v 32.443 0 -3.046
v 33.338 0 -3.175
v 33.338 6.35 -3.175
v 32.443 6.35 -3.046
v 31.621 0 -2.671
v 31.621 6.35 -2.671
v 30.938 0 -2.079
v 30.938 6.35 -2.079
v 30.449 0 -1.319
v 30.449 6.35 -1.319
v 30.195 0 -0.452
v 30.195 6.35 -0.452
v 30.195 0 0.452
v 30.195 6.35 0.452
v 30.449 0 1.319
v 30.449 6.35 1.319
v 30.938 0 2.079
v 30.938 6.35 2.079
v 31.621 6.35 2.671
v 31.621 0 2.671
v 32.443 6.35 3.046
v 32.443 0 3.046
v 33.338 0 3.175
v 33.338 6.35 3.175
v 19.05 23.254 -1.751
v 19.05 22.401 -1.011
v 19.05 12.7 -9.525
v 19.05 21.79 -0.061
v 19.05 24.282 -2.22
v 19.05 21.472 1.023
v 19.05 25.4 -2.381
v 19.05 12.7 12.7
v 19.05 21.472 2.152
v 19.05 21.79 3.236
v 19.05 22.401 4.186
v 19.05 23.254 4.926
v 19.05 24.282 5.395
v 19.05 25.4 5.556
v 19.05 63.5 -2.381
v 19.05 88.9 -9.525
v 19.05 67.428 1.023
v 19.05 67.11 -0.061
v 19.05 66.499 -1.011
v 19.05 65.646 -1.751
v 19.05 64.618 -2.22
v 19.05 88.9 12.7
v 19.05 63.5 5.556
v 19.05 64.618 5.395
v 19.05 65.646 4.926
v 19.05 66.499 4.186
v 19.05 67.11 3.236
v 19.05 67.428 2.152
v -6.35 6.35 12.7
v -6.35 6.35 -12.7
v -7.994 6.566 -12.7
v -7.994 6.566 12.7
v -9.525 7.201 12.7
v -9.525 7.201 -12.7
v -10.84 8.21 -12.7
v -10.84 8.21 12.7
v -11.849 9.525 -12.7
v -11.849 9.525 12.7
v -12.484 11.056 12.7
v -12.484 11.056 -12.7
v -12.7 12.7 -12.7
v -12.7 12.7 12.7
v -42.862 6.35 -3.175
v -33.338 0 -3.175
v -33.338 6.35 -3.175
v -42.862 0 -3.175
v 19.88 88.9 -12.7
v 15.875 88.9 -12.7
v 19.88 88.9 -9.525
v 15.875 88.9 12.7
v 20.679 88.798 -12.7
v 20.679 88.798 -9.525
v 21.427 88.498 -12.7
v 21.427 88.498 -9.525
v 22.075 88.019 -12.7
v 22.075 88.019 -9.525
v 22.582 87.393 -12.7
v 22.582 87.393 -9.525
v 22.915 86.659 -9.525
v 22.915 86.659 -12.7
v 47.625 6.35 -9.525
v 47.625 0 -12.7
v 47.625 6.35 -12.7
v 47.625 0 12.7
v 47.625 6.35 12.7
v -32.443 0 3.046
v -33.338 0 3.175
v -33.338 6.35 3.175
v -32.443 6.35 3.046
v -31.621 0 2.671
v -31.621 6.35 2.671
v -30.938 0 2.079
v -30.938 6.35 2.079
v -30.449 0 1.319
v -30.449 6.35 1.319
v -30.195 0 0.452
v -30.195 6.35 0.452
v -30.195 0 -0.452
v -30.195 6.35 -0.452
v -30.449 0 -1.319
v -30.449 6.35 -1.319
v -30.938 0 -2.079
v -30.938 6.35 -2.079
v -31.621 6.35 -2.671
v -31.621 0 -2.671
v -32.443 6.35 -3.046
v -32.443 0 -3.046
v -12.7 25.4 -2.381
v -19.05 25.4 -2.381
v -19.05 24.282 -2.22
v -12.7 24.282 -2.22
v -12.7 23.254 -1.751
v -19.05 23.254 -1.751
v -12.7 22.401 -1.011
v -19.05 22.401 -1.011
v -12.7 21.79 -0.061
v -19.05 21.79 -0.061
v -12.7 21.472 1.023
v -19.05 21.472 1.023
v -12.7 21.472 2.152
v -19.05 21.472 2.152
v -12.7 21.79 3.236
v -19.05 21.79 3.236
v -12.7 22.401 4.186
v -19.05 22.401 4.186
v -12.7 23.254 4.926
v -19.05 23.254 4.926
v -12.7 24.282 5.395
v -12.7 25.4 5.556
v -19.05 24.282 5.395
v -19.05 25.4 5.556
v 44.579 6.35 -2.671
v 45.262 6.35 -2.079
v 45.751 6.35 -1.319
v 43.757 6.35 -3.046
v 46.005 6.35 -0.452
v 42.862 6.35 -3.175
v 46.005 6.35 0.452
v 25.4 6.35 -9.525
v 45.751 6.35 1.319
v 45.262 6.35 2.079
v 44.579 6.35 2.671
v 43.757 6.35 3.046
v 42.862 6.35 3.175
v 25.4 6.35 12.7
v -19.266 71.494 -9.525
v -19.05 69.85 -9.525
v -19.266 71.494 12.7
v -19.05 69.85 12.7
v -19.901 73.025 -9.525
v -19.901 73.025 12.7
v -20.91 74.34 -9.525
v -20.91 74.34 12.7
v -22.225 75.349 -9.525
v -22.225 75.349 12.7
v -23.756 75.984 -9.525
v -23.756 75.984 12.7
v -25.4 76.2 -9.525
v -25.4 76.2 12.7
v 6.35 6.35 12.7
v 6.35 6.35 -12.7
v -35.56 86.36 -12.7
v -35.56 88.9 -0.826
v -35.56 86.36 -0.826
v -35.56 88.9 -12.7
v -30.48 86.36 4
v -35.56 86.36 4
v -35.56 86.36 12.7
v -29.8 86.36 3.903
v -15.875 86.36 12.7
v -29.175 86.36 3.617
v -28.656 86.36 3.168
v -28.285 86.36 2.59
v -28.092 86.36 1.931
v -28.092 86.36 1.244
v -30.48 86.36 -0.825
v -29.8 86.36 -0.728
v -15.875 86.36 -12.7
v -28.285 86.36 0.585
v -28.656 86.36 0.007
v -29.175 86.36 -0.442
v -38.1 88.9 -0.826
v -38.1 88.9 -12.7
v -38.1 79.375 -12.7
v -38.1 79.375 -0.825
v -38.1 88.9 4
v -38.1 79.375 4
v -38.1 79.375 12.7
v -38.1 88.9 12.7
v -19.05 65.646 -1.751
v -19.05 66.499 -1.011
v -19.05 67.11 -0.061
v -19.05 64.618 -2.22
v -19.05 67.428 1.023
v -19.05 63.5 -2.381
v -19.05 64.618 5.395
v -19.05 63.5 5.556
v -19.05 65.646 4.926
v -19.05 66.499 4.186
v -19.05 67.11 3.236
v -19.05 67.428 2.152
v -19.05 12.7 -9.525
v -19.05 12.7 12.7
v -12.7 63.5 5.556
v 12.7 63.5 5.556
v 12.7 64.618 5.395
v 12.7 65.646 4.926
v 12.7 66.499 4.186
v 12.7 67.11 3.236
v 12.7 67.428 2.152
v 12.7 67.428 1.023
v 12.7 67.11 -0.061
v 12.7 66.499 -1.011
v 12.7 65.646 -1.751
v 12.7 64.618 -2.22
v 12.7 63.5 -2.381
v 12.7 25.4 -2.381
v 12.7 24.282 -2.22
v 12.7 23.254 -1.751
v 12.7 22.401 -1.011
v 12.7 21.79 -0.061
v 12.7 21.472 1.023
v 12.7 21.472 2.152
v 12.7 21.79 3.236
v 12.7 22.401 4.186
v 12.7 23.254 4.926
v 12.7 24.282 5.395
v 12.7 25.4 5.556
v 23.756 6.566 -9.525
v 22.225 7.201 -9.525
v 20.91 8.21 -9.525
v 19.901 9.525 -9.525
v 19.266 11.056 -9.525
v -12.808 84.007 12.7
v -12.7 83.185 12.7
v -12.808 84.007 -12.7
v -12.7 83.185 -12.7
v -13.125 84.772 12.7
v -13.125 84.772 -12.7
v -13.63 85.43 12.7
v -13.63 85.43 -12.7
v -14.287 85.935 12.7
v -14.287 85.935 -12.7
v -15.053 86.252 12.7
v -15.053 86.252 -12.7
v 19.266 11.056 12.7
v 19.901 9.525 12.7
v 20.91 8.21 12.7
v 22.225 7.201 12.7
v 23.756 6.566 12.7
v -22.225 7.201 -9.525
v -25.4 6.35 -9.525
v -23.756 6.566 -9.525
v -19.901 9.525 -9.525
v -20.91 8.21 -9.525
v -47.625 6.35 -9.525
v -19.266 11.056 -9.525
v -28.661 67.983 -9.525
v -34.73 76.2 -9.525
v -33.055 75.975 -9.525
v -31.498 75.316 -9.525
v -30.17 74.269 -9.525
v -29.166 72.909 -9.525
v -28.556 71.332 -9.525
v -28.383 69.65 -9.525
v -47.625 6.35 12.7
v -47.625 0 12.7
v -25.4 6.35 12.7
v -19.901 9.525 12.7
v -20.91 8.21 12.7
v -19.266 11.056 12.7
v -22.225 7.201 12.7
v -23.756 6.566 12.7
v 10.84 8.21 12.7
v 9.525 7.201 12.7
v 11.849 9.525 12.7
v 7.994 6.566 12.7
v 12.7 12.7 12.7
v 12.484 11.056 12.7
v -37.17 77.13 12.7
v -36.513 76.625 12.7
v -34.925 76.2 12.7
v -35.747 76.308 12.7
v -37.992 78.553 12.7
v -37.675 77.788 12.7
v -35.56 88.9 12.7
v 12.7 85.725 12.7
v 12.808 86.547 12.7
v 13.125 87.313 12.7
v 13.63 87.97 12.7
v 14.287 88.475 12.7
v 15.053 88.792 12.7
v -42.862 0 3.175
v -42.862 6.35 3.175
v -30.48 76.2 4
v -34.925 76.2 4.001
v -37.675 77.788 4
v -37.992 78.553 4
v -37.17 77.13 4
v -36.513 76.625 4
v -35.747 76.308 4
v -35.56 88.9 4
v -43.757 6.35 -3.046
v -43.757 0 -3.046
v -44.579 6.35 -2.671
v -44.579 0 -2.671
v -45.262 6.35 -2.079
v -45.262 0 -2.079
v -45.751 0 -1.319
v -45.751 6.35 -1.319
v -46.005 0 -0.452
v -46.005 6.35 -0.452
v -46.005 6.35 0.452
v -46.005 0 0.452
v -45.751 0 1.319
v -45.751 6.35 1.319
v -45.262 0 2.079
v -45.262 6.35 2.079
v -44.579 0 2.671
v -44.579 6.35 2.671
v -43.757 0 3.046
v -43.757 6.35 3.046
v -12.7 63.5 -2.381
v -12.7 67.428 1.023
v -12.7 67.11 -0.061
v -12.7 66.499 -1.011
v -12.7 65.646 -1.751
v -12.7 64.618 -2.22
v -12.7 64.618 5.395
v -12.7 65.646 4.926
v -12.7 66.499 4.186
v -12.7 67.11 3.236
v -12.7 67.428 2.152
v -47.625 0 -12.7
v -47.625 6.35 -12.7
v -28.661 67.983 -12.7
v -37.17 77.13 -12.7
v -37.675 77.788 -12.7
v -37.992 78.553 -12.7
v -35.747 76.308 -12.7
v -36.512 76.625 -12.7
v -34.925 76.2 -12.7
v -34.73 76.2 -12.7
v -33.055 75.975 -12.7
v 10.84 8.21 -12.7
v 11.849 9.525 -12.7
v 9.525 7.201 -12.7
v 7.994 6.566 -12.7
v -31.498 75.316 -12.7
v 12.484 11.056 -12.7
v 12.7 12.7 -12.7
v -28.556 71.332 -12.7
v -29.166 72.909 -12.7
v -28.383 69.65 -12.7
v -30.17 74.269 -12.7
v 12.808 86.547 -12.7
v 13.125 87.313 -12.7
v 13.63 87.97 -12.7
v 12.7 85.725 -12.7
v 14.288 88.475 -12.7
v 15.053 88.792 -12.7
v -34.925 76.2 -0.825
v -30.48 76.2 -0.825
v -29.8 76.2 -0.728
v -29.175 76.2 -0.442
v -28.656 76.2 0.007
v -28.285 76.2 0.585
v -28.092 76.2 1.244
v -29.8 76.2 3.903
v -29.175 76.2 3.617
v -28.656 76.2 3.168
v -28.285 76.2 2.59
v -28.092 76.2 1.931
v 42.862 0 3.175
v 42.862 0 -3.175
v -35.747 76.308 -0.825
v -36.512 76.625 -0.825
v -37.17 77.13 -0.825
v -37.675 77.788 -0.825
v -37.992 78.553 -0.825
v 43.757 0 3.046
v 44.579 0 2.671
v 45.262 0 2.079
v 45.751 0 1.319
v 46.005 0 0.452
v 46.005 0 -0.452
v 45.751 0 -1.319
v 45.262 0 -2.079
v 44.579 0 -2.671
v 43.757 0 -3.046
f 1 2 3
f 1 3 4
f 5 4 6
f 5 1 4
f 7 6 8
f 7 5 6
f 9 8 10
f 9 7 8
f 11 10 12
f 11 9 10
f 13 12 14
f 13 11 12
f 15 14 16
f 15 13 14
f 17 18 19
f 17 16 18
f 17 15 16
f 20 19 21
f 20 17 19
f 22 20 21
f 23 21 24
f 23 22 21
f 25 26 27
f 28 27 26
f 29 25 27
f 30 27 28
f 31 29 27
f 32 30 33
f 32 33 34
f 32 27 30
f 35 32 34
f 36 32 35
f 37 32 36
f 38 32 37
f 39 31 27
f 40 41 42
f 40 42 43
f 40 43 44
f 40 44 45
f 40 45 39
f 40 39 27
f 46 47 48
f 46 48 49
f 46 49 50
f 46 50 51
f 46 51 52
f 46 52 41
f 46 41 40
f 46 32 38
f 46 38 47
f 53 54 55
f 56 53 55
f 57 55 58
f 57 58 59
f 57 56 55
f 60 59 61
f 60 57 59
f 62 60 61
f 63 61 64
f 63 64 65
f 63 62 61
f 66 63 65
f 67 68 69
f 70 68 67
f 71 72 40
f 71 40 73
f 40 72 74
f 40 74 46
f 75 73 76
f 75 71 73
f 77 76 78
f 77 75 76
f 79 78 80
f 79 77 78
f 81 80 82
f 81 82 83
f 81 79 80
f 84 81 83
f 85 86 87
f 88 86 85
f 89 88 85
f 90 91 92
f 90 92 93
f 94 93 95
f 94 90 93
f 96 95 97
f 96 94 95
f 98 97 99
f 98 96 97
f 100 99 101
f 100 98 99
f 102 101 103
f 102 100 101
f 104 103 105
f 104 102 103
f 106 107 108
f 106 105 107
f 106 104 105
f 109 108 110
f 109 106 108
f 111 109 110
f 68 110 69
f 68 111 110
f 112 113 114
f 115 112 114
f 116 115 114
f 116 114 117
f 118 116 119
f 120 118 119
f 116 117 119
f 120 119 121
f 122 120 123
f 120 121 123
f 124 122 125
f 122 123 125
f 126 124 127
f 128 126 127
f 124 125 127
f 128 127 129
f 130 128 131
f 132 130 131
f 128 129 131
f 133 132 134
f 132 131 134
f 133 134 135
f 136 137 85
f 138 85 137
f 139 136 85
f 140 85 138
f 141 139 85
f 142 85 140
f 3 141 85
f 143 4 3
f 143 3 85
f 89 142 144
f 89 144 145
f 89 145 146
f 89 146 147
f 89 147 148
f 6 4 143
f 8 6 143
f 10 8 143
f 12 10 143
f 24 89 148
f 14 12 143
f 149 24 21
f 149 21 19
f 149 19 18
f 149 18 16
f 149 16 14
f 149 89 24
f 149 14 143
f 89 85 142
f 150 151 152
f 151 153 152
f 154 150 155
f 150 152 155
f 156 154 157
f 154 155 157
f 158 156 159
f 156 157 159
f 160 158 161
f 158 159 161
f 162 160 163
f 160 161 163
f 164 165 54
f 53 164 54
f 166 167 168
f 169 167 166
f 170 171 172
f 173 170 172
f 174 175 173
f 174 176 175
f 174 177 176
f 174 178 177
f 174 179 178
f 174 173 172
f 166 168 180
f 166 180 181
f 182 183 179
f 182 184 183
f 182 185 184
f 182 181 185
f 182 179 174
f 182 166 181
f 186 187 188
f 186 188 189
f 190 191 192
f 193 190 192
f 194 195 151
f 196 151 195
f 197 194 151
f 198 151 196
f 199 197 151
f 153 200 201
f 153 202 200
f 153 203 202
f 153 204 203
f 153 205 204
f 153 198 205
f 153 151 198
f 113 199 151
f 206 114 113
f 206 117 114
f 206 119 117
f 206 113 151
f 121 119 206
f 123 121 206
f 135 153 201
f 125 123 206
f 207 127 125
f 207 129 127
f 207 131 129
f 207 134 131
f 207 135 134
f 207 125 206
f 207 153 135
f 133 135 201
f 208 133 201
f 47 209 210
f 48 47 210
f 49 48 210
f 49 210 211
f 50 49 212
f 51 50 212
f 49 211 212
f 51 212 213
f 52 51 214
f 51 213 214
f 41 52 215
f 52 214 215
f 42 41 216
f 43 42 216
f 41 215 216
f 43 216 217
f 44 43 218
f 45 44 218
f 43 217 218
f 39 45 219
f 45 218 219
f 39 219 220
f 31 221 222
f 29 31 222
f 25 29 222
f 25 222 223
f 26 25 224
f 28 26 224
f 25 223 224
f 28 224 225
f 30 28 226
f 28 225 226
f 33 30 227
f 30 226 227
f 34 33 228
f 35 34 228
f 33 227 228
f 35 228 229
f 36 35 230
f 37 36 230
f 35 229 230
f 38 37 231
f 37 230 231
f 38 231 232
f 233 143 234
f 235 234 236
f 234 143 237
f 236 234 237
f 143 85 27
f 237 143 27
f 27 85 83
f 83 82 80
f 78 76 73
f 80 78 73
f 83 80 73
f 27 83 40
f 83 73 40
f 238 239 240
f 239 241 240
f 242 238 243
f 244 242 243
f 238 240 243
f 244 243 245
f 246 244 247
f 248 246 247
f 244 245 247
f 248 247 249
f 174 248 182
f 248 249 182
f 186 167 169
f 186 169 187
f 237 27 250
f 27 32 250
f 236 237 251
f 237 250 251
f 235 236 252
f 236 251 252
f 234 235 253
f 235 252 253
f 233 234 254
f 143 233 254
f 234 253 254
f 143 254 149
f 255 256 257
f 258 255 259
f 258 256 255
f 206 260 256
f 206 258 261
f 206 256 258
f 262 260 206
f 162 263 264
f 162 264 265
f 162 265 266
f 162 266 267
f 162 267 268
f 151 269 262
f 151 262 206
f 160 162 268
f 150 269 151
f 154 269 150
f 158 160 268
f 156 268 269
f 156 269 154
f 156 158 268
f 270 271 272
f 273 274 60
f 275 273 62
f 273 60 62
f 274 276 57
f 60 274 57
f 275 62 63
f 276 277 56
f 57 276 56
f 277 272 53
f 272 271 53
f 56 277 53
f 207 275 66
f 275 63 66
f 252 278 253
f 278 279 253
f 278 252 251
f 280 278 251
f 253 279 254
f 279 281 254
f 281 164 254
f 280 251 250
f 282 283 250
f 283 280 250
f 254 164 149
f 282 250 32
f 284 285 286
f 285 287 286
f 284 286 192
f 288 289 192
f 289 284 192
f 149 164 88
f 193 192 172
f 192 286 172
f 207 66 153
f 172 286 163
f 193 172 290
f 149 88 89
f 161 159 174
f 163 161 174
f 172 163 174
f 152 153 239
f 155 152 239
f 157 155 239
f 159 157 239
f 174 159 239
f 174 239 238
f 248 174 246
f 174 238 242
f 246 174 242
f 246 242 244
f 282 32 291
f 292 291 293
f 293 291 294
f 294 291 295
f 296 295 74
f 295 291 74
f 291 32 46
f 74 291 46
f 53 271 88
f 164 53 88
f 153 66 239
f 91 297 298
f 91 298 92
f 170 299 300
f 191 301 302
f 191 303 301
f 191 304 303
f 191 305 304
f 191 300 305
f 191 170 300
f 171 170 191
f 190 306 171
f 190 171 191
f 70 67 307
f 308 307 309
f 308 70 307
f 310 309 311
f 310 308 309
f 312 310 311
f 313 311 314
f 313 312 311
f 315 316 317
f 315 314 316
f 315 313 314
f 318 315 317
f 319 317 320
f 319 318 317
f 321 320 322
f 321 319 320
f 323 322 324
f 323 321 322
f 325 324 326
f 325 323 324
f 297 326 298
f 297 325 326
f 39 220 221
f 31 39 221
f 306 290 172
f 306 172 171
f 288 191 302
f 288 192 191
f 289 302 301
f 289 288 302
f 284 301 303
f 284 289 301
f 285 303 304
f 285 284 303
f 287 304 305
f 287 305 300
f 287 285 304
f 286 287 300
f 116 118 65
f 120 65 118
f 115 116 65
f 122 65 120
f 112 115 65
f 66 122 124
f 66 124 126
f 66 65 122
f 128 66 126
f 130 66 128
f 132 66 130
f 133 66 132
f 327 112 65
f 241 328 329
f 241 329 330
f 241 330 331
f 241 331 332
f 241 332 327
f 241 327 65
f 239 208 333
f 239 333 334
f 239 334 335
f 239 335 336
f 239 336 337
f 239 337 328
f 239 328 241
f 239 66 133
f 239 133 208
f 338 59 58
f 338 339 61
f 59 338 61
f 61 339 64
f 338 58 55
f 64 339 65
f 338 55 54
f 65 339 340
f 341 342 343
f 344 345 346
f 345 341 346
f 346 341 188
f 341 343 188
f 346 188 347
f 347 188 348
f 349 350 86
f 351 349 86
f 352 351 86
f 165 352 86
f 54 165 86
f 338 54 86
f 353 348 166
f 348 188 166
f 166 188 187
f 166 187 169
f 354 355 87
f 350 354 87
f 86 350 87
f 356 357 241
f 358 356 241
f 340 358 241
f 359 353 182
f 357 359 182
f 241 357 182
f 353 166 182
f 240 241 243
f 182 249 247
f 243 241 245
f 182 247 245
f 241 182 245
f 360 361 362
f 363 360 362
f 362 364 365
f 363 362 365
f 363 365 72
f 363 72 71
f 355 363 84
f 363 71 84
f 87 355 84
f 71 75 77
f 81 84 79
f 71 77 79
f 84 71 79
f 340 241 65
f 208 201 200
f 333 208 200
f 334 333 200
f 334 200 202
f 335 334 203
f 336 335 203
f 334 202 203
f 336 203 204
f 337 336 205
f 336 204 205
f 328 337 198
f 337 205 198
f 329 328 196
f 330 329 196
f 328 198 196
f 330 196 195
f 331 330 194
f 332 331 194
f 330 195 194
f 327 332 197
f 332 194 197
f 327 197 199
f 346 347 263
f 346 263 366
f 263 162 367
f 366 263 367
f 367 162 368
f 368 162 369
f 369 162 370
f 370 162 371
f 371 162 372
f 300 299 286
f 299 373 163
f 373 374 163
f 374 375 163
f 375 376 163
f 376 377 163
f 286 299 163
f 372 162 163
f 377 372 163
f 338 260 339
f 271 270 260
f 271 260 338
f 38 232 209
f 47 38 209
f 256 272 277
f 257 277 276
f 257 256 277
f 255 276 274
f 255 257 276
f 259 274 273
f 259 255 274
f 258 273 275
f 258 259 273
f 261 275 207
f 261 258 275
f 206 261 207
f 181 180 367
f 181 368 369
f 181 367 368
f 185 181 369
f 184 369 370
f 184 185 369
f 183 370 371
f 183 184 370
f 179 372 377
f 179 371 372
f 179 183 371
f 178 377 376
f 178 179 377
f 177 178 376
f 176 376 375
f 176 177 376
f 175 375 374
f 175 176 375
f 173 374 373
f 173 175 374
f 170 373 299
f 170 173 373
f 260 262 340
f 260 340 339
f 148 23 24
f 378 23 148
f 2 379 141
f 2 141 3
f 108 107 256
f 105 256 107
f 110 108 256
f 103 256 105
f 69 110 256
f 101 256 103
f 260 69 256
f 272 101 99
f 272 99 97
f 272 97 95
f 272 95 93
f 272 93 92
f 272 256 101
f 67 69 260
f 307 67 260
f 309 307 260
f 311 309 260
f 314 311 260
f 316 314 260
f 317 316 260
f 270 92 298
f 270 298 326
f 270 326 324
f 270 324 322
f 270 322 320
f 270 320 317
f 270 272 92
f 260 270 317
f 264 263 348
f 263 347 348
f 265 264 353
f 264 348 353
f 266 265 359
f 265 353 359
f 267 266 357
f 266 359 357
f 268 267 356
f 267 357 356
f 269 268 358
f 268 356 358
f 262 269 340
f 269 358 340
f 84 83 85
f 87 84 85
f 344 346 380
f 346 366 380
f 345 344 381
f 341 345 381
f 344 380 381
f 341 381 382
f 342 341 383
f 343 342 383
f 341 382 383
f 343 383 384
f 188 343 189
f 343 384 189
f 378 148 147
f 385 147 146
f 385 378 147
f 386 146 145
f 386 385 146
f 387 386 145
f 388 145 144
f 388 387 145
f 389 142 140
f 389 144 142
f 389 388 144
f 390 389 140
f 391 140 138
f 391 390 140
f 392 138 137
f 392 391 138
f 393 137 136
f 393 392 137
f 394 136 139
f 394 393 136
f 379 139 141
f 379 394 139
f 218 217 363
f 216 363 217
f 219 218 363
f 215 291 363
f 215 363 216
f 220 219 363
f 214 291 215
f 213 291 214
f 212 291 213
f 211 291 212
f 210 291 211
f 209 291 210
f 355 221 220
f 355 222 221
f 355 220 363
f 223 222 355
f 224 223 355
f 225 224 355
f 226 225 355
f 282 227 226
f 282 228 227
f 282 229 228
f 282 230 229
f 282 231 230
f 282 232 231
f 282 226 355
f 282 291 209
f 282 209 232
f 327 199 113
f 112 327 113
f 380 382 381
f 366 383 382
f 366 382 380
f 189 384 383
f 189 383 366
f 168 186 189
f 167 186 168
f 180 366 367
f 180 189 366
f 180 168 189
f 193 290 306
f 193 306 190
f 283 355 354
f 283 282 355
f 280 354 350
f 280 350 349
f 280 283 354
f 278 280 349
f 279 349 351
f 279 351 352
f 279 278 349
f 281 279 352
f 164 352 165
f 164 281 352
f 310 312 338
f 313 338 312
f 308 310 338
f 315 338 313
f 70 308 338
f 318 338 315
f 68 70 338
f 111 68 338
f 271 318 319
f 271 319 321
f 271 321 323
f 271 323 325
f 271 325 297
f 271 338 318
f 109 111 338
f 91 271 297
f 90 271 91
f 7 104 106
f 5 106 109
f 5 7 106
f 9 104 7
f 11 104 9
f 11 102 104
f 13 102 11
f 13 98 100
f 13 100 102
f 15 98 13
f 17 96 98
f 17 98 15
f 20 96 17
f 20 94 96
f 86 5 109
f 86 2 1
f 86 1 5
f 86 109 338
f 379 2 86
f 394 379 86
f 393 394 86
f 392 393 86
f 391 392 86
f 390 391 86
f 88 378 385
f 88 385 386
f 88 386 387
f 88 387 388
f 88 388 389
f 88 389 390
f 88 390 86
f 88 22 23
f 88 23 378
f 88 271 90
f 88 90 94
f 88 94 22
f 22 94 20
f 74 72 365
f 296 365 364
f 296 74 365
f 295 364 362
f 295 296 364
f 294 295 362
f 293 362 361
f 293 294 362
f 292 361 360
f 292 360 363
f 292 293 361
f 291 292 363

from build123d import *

# Parameters (mm, degrees)
BOSS_EXTRUDE1_DEPTH     = 12.7
RIB3_START              = -3.175
RIB3_DEPTH              = 3.175
CUT_EXTRUDE3_DEPTH      = 102.649597269
CUT_EXTRUDE3_DEPTH_BACK = 102.649597269
CUT_EXTRUDE4_DEPTH      = 102.649597269
SKETCH6_W               = 25.4
SKETCH6_H               = 12.7
BOSS_EXTRUDE2_DEPTH     = 19.05
CUT_EXTRUDE5_DEPTH      = 19.05
SKETCH9_W               = 22.86
SKETCH9_H               = 25.4
CUT_EXTRUDE6_DEPTH      = 2.54
FILLET4_R               = 3.175
FILLET5_R               = 6.35


# Read off the part's stored shape, not the designer's step: Rib3
with BuildPart() as part:
    # Sketch1 → Boss-Extrude1 (new, symmetric)
    with BuildSketch(Plane.XY):
        Polygon((-47.625, 0), (47.625, 0), (47.625, 6.35), (19.05, 6.35), (19.05, 88.9), (12.7, 88.9), (12.7, 6.35), (-12.7, 6.35), (-12.7, 88.9), (-19.05, 88.9), (-19.05, 6.35), (-47.625, 6.35), align=None)
    extrude(amount=BOSS_EXTRUDE1_DEPTH, both=True)

    # Rib3 outline → Rib3 (add)
    with BuildSketch(Plane(origin=(0, 0, -12.7), x_dir=(-1, 0, 0), z_dir=(0, 0, -1)).offset(RIB3_START)):
        Polygon((-19.05, 88.9), (-22.225, 88.9), (-47.625, 6.35), (-19.05, 6.35), align=None)
    rib3 = extrude(amount=RIB3_DEPTH)

    # Mirror1: Rib3 across plane
    add(rib3.mirror(Plane(origin=(0, 0, 0), x_dir=(0, 0, 1), z_dir=(1, 0, 0))))

    # Sketch4 → Cut-Extrude3 (cut, two sides: drawn at the far end of the back side and taken through both)
    with BuildSketch(Plane(origin=(0, 0, 0), x_dir=(0, 0, -1), z_dir=(1, 0, 0)).offset(-CUT_EXTRUDE3_DEPTH_BACK)):
        with BuildLine():
            Line((2.38125, 63.5), (2.38125, 25.4))
            ThreePointArc((2.38125, 25.4), (-1.5875, 21.43125), (-5.55625, 25.4))
            Line((-5.55625, 25.4), (-5.55625, 63.5))
            ThreePointArc((-5.55625, 63.5), (-1.5875, 67.46875), (2.38125, 63.5))
        make_face()
    extrude(amount=CUT_EXTRUDE3_DEPTH + CUT_EXTRUDE3_DEPTH_BACK, mode=Mode.SUBTRACT)

    # Sketch5 → Cut-Extrude4 (cut, through all)
    with BuildSketch(Plane.XZ):
        with BuildLine():
            Line((-42.8625, 3.175), (-33.3375, 3.175))
            ThreePointArc((-33.3375, 3.175), (-30.1625, 0), (-33.3375, -3.175))
            Line((-33.3375, -3.175), (-42.8625, -3.175))
            ThreePointArc((-42.8625, -3.175), (-46.0375, 0), (-42.8625, 3.175))
        make_face()
        with BuildLine():
            Line((42.8625, -3.175), (33.3375, -3.175))
            ThreePointArc((33.3375, -3.175), (30.1625, 0), (33.3375, 3.175))
            Line((33.3375, 3.175), (42.8625, 3.175))
            ThreePointArc((42.8625, 3.175), (46.0375, 0), (42.8625, -3.175))
        make_face()
    extrude(amount=-CUT_EXTRUDE4_DEPTH, mode=Mode.SUBTRACT)

    # Sketch6 → Boss-Extrude2 (add)
    with BuildSketch(Plane.ZY.offset(19.05)):
        with Locations((0, 82.55)):
            Rectangle(SKETCH6_W, SKETCH6_H)
    extrude(amount=BOSS_EXTRUDE2_DEPTH)

    # Sketch7 → Cut-Extrude5 (cut)
    with BuildSketch(Plane(origin=(0, 88.9, 0), x_dir=(1, 0, 0), z_dir=(0, 1, 0))):
        with BuildLine():
            Line((-30.48, -4.0005), (-43.18, -4.0005))
            ThreePointArc((-43.18, -4.0005), (-45.593, -1.5875), (-43.18, 0.8255))
            Line((-43.18, 0.8255), (-30.48, 0.8255))
            ThreePointArc((-30.48, 0.8255), (-28.067, -1.5875), (-30.48, -4.0005))
        make_face()
    extrude(amount=-CUT_EXTRUDE5_DEPTH, mode=Mode.SUBTRACT)

    # Sketch9 → Cut-Extrude6 (cut)
    with BuildSketch(Plane(origin=(0, 88.9, 0), x_dir=(1, 0, 0), z_dir=(0, 1, 0))):
        with Locations((-24.13, 0)):
            Rectangle(SKETCH9_W, SKETCH9_H)
    extrude(amount=-CUT_EXTRUDE6_DEPTH, mode=Mode.SUBTRACT)

    # Fillet4
    fillet4_edges = [part.edges().sort_by_distance(p)[0] for p in [
        (-38.1, 76.2, -6.76275),
        (-38.1, 76.2, 8.35025),
        (12.7, 88.9, 0),
        (-12.7, 86.36, 0),
        (22.225, 88.9, -11.1125),
    ]]
    fillet(fillet4_edges, radius=FILLET4_R)

    # Fillet5
    fillet5_edges = [part.edges().sort_by_distance(p)[0] for p in [
        (-26.132692308, 76.2, -11.1125),
        (-19.05, 76.2, 1.5875),
        (-19.05, 6.35, 1.5875),
        (-12.7, 6.35, 0),
        (12.7, 6.35, 0),
        (19.05, 6.35, 1.5875),
    ]]
    fillet(fillet5_edges, radius=FILLET5_R)


solid = part.part
